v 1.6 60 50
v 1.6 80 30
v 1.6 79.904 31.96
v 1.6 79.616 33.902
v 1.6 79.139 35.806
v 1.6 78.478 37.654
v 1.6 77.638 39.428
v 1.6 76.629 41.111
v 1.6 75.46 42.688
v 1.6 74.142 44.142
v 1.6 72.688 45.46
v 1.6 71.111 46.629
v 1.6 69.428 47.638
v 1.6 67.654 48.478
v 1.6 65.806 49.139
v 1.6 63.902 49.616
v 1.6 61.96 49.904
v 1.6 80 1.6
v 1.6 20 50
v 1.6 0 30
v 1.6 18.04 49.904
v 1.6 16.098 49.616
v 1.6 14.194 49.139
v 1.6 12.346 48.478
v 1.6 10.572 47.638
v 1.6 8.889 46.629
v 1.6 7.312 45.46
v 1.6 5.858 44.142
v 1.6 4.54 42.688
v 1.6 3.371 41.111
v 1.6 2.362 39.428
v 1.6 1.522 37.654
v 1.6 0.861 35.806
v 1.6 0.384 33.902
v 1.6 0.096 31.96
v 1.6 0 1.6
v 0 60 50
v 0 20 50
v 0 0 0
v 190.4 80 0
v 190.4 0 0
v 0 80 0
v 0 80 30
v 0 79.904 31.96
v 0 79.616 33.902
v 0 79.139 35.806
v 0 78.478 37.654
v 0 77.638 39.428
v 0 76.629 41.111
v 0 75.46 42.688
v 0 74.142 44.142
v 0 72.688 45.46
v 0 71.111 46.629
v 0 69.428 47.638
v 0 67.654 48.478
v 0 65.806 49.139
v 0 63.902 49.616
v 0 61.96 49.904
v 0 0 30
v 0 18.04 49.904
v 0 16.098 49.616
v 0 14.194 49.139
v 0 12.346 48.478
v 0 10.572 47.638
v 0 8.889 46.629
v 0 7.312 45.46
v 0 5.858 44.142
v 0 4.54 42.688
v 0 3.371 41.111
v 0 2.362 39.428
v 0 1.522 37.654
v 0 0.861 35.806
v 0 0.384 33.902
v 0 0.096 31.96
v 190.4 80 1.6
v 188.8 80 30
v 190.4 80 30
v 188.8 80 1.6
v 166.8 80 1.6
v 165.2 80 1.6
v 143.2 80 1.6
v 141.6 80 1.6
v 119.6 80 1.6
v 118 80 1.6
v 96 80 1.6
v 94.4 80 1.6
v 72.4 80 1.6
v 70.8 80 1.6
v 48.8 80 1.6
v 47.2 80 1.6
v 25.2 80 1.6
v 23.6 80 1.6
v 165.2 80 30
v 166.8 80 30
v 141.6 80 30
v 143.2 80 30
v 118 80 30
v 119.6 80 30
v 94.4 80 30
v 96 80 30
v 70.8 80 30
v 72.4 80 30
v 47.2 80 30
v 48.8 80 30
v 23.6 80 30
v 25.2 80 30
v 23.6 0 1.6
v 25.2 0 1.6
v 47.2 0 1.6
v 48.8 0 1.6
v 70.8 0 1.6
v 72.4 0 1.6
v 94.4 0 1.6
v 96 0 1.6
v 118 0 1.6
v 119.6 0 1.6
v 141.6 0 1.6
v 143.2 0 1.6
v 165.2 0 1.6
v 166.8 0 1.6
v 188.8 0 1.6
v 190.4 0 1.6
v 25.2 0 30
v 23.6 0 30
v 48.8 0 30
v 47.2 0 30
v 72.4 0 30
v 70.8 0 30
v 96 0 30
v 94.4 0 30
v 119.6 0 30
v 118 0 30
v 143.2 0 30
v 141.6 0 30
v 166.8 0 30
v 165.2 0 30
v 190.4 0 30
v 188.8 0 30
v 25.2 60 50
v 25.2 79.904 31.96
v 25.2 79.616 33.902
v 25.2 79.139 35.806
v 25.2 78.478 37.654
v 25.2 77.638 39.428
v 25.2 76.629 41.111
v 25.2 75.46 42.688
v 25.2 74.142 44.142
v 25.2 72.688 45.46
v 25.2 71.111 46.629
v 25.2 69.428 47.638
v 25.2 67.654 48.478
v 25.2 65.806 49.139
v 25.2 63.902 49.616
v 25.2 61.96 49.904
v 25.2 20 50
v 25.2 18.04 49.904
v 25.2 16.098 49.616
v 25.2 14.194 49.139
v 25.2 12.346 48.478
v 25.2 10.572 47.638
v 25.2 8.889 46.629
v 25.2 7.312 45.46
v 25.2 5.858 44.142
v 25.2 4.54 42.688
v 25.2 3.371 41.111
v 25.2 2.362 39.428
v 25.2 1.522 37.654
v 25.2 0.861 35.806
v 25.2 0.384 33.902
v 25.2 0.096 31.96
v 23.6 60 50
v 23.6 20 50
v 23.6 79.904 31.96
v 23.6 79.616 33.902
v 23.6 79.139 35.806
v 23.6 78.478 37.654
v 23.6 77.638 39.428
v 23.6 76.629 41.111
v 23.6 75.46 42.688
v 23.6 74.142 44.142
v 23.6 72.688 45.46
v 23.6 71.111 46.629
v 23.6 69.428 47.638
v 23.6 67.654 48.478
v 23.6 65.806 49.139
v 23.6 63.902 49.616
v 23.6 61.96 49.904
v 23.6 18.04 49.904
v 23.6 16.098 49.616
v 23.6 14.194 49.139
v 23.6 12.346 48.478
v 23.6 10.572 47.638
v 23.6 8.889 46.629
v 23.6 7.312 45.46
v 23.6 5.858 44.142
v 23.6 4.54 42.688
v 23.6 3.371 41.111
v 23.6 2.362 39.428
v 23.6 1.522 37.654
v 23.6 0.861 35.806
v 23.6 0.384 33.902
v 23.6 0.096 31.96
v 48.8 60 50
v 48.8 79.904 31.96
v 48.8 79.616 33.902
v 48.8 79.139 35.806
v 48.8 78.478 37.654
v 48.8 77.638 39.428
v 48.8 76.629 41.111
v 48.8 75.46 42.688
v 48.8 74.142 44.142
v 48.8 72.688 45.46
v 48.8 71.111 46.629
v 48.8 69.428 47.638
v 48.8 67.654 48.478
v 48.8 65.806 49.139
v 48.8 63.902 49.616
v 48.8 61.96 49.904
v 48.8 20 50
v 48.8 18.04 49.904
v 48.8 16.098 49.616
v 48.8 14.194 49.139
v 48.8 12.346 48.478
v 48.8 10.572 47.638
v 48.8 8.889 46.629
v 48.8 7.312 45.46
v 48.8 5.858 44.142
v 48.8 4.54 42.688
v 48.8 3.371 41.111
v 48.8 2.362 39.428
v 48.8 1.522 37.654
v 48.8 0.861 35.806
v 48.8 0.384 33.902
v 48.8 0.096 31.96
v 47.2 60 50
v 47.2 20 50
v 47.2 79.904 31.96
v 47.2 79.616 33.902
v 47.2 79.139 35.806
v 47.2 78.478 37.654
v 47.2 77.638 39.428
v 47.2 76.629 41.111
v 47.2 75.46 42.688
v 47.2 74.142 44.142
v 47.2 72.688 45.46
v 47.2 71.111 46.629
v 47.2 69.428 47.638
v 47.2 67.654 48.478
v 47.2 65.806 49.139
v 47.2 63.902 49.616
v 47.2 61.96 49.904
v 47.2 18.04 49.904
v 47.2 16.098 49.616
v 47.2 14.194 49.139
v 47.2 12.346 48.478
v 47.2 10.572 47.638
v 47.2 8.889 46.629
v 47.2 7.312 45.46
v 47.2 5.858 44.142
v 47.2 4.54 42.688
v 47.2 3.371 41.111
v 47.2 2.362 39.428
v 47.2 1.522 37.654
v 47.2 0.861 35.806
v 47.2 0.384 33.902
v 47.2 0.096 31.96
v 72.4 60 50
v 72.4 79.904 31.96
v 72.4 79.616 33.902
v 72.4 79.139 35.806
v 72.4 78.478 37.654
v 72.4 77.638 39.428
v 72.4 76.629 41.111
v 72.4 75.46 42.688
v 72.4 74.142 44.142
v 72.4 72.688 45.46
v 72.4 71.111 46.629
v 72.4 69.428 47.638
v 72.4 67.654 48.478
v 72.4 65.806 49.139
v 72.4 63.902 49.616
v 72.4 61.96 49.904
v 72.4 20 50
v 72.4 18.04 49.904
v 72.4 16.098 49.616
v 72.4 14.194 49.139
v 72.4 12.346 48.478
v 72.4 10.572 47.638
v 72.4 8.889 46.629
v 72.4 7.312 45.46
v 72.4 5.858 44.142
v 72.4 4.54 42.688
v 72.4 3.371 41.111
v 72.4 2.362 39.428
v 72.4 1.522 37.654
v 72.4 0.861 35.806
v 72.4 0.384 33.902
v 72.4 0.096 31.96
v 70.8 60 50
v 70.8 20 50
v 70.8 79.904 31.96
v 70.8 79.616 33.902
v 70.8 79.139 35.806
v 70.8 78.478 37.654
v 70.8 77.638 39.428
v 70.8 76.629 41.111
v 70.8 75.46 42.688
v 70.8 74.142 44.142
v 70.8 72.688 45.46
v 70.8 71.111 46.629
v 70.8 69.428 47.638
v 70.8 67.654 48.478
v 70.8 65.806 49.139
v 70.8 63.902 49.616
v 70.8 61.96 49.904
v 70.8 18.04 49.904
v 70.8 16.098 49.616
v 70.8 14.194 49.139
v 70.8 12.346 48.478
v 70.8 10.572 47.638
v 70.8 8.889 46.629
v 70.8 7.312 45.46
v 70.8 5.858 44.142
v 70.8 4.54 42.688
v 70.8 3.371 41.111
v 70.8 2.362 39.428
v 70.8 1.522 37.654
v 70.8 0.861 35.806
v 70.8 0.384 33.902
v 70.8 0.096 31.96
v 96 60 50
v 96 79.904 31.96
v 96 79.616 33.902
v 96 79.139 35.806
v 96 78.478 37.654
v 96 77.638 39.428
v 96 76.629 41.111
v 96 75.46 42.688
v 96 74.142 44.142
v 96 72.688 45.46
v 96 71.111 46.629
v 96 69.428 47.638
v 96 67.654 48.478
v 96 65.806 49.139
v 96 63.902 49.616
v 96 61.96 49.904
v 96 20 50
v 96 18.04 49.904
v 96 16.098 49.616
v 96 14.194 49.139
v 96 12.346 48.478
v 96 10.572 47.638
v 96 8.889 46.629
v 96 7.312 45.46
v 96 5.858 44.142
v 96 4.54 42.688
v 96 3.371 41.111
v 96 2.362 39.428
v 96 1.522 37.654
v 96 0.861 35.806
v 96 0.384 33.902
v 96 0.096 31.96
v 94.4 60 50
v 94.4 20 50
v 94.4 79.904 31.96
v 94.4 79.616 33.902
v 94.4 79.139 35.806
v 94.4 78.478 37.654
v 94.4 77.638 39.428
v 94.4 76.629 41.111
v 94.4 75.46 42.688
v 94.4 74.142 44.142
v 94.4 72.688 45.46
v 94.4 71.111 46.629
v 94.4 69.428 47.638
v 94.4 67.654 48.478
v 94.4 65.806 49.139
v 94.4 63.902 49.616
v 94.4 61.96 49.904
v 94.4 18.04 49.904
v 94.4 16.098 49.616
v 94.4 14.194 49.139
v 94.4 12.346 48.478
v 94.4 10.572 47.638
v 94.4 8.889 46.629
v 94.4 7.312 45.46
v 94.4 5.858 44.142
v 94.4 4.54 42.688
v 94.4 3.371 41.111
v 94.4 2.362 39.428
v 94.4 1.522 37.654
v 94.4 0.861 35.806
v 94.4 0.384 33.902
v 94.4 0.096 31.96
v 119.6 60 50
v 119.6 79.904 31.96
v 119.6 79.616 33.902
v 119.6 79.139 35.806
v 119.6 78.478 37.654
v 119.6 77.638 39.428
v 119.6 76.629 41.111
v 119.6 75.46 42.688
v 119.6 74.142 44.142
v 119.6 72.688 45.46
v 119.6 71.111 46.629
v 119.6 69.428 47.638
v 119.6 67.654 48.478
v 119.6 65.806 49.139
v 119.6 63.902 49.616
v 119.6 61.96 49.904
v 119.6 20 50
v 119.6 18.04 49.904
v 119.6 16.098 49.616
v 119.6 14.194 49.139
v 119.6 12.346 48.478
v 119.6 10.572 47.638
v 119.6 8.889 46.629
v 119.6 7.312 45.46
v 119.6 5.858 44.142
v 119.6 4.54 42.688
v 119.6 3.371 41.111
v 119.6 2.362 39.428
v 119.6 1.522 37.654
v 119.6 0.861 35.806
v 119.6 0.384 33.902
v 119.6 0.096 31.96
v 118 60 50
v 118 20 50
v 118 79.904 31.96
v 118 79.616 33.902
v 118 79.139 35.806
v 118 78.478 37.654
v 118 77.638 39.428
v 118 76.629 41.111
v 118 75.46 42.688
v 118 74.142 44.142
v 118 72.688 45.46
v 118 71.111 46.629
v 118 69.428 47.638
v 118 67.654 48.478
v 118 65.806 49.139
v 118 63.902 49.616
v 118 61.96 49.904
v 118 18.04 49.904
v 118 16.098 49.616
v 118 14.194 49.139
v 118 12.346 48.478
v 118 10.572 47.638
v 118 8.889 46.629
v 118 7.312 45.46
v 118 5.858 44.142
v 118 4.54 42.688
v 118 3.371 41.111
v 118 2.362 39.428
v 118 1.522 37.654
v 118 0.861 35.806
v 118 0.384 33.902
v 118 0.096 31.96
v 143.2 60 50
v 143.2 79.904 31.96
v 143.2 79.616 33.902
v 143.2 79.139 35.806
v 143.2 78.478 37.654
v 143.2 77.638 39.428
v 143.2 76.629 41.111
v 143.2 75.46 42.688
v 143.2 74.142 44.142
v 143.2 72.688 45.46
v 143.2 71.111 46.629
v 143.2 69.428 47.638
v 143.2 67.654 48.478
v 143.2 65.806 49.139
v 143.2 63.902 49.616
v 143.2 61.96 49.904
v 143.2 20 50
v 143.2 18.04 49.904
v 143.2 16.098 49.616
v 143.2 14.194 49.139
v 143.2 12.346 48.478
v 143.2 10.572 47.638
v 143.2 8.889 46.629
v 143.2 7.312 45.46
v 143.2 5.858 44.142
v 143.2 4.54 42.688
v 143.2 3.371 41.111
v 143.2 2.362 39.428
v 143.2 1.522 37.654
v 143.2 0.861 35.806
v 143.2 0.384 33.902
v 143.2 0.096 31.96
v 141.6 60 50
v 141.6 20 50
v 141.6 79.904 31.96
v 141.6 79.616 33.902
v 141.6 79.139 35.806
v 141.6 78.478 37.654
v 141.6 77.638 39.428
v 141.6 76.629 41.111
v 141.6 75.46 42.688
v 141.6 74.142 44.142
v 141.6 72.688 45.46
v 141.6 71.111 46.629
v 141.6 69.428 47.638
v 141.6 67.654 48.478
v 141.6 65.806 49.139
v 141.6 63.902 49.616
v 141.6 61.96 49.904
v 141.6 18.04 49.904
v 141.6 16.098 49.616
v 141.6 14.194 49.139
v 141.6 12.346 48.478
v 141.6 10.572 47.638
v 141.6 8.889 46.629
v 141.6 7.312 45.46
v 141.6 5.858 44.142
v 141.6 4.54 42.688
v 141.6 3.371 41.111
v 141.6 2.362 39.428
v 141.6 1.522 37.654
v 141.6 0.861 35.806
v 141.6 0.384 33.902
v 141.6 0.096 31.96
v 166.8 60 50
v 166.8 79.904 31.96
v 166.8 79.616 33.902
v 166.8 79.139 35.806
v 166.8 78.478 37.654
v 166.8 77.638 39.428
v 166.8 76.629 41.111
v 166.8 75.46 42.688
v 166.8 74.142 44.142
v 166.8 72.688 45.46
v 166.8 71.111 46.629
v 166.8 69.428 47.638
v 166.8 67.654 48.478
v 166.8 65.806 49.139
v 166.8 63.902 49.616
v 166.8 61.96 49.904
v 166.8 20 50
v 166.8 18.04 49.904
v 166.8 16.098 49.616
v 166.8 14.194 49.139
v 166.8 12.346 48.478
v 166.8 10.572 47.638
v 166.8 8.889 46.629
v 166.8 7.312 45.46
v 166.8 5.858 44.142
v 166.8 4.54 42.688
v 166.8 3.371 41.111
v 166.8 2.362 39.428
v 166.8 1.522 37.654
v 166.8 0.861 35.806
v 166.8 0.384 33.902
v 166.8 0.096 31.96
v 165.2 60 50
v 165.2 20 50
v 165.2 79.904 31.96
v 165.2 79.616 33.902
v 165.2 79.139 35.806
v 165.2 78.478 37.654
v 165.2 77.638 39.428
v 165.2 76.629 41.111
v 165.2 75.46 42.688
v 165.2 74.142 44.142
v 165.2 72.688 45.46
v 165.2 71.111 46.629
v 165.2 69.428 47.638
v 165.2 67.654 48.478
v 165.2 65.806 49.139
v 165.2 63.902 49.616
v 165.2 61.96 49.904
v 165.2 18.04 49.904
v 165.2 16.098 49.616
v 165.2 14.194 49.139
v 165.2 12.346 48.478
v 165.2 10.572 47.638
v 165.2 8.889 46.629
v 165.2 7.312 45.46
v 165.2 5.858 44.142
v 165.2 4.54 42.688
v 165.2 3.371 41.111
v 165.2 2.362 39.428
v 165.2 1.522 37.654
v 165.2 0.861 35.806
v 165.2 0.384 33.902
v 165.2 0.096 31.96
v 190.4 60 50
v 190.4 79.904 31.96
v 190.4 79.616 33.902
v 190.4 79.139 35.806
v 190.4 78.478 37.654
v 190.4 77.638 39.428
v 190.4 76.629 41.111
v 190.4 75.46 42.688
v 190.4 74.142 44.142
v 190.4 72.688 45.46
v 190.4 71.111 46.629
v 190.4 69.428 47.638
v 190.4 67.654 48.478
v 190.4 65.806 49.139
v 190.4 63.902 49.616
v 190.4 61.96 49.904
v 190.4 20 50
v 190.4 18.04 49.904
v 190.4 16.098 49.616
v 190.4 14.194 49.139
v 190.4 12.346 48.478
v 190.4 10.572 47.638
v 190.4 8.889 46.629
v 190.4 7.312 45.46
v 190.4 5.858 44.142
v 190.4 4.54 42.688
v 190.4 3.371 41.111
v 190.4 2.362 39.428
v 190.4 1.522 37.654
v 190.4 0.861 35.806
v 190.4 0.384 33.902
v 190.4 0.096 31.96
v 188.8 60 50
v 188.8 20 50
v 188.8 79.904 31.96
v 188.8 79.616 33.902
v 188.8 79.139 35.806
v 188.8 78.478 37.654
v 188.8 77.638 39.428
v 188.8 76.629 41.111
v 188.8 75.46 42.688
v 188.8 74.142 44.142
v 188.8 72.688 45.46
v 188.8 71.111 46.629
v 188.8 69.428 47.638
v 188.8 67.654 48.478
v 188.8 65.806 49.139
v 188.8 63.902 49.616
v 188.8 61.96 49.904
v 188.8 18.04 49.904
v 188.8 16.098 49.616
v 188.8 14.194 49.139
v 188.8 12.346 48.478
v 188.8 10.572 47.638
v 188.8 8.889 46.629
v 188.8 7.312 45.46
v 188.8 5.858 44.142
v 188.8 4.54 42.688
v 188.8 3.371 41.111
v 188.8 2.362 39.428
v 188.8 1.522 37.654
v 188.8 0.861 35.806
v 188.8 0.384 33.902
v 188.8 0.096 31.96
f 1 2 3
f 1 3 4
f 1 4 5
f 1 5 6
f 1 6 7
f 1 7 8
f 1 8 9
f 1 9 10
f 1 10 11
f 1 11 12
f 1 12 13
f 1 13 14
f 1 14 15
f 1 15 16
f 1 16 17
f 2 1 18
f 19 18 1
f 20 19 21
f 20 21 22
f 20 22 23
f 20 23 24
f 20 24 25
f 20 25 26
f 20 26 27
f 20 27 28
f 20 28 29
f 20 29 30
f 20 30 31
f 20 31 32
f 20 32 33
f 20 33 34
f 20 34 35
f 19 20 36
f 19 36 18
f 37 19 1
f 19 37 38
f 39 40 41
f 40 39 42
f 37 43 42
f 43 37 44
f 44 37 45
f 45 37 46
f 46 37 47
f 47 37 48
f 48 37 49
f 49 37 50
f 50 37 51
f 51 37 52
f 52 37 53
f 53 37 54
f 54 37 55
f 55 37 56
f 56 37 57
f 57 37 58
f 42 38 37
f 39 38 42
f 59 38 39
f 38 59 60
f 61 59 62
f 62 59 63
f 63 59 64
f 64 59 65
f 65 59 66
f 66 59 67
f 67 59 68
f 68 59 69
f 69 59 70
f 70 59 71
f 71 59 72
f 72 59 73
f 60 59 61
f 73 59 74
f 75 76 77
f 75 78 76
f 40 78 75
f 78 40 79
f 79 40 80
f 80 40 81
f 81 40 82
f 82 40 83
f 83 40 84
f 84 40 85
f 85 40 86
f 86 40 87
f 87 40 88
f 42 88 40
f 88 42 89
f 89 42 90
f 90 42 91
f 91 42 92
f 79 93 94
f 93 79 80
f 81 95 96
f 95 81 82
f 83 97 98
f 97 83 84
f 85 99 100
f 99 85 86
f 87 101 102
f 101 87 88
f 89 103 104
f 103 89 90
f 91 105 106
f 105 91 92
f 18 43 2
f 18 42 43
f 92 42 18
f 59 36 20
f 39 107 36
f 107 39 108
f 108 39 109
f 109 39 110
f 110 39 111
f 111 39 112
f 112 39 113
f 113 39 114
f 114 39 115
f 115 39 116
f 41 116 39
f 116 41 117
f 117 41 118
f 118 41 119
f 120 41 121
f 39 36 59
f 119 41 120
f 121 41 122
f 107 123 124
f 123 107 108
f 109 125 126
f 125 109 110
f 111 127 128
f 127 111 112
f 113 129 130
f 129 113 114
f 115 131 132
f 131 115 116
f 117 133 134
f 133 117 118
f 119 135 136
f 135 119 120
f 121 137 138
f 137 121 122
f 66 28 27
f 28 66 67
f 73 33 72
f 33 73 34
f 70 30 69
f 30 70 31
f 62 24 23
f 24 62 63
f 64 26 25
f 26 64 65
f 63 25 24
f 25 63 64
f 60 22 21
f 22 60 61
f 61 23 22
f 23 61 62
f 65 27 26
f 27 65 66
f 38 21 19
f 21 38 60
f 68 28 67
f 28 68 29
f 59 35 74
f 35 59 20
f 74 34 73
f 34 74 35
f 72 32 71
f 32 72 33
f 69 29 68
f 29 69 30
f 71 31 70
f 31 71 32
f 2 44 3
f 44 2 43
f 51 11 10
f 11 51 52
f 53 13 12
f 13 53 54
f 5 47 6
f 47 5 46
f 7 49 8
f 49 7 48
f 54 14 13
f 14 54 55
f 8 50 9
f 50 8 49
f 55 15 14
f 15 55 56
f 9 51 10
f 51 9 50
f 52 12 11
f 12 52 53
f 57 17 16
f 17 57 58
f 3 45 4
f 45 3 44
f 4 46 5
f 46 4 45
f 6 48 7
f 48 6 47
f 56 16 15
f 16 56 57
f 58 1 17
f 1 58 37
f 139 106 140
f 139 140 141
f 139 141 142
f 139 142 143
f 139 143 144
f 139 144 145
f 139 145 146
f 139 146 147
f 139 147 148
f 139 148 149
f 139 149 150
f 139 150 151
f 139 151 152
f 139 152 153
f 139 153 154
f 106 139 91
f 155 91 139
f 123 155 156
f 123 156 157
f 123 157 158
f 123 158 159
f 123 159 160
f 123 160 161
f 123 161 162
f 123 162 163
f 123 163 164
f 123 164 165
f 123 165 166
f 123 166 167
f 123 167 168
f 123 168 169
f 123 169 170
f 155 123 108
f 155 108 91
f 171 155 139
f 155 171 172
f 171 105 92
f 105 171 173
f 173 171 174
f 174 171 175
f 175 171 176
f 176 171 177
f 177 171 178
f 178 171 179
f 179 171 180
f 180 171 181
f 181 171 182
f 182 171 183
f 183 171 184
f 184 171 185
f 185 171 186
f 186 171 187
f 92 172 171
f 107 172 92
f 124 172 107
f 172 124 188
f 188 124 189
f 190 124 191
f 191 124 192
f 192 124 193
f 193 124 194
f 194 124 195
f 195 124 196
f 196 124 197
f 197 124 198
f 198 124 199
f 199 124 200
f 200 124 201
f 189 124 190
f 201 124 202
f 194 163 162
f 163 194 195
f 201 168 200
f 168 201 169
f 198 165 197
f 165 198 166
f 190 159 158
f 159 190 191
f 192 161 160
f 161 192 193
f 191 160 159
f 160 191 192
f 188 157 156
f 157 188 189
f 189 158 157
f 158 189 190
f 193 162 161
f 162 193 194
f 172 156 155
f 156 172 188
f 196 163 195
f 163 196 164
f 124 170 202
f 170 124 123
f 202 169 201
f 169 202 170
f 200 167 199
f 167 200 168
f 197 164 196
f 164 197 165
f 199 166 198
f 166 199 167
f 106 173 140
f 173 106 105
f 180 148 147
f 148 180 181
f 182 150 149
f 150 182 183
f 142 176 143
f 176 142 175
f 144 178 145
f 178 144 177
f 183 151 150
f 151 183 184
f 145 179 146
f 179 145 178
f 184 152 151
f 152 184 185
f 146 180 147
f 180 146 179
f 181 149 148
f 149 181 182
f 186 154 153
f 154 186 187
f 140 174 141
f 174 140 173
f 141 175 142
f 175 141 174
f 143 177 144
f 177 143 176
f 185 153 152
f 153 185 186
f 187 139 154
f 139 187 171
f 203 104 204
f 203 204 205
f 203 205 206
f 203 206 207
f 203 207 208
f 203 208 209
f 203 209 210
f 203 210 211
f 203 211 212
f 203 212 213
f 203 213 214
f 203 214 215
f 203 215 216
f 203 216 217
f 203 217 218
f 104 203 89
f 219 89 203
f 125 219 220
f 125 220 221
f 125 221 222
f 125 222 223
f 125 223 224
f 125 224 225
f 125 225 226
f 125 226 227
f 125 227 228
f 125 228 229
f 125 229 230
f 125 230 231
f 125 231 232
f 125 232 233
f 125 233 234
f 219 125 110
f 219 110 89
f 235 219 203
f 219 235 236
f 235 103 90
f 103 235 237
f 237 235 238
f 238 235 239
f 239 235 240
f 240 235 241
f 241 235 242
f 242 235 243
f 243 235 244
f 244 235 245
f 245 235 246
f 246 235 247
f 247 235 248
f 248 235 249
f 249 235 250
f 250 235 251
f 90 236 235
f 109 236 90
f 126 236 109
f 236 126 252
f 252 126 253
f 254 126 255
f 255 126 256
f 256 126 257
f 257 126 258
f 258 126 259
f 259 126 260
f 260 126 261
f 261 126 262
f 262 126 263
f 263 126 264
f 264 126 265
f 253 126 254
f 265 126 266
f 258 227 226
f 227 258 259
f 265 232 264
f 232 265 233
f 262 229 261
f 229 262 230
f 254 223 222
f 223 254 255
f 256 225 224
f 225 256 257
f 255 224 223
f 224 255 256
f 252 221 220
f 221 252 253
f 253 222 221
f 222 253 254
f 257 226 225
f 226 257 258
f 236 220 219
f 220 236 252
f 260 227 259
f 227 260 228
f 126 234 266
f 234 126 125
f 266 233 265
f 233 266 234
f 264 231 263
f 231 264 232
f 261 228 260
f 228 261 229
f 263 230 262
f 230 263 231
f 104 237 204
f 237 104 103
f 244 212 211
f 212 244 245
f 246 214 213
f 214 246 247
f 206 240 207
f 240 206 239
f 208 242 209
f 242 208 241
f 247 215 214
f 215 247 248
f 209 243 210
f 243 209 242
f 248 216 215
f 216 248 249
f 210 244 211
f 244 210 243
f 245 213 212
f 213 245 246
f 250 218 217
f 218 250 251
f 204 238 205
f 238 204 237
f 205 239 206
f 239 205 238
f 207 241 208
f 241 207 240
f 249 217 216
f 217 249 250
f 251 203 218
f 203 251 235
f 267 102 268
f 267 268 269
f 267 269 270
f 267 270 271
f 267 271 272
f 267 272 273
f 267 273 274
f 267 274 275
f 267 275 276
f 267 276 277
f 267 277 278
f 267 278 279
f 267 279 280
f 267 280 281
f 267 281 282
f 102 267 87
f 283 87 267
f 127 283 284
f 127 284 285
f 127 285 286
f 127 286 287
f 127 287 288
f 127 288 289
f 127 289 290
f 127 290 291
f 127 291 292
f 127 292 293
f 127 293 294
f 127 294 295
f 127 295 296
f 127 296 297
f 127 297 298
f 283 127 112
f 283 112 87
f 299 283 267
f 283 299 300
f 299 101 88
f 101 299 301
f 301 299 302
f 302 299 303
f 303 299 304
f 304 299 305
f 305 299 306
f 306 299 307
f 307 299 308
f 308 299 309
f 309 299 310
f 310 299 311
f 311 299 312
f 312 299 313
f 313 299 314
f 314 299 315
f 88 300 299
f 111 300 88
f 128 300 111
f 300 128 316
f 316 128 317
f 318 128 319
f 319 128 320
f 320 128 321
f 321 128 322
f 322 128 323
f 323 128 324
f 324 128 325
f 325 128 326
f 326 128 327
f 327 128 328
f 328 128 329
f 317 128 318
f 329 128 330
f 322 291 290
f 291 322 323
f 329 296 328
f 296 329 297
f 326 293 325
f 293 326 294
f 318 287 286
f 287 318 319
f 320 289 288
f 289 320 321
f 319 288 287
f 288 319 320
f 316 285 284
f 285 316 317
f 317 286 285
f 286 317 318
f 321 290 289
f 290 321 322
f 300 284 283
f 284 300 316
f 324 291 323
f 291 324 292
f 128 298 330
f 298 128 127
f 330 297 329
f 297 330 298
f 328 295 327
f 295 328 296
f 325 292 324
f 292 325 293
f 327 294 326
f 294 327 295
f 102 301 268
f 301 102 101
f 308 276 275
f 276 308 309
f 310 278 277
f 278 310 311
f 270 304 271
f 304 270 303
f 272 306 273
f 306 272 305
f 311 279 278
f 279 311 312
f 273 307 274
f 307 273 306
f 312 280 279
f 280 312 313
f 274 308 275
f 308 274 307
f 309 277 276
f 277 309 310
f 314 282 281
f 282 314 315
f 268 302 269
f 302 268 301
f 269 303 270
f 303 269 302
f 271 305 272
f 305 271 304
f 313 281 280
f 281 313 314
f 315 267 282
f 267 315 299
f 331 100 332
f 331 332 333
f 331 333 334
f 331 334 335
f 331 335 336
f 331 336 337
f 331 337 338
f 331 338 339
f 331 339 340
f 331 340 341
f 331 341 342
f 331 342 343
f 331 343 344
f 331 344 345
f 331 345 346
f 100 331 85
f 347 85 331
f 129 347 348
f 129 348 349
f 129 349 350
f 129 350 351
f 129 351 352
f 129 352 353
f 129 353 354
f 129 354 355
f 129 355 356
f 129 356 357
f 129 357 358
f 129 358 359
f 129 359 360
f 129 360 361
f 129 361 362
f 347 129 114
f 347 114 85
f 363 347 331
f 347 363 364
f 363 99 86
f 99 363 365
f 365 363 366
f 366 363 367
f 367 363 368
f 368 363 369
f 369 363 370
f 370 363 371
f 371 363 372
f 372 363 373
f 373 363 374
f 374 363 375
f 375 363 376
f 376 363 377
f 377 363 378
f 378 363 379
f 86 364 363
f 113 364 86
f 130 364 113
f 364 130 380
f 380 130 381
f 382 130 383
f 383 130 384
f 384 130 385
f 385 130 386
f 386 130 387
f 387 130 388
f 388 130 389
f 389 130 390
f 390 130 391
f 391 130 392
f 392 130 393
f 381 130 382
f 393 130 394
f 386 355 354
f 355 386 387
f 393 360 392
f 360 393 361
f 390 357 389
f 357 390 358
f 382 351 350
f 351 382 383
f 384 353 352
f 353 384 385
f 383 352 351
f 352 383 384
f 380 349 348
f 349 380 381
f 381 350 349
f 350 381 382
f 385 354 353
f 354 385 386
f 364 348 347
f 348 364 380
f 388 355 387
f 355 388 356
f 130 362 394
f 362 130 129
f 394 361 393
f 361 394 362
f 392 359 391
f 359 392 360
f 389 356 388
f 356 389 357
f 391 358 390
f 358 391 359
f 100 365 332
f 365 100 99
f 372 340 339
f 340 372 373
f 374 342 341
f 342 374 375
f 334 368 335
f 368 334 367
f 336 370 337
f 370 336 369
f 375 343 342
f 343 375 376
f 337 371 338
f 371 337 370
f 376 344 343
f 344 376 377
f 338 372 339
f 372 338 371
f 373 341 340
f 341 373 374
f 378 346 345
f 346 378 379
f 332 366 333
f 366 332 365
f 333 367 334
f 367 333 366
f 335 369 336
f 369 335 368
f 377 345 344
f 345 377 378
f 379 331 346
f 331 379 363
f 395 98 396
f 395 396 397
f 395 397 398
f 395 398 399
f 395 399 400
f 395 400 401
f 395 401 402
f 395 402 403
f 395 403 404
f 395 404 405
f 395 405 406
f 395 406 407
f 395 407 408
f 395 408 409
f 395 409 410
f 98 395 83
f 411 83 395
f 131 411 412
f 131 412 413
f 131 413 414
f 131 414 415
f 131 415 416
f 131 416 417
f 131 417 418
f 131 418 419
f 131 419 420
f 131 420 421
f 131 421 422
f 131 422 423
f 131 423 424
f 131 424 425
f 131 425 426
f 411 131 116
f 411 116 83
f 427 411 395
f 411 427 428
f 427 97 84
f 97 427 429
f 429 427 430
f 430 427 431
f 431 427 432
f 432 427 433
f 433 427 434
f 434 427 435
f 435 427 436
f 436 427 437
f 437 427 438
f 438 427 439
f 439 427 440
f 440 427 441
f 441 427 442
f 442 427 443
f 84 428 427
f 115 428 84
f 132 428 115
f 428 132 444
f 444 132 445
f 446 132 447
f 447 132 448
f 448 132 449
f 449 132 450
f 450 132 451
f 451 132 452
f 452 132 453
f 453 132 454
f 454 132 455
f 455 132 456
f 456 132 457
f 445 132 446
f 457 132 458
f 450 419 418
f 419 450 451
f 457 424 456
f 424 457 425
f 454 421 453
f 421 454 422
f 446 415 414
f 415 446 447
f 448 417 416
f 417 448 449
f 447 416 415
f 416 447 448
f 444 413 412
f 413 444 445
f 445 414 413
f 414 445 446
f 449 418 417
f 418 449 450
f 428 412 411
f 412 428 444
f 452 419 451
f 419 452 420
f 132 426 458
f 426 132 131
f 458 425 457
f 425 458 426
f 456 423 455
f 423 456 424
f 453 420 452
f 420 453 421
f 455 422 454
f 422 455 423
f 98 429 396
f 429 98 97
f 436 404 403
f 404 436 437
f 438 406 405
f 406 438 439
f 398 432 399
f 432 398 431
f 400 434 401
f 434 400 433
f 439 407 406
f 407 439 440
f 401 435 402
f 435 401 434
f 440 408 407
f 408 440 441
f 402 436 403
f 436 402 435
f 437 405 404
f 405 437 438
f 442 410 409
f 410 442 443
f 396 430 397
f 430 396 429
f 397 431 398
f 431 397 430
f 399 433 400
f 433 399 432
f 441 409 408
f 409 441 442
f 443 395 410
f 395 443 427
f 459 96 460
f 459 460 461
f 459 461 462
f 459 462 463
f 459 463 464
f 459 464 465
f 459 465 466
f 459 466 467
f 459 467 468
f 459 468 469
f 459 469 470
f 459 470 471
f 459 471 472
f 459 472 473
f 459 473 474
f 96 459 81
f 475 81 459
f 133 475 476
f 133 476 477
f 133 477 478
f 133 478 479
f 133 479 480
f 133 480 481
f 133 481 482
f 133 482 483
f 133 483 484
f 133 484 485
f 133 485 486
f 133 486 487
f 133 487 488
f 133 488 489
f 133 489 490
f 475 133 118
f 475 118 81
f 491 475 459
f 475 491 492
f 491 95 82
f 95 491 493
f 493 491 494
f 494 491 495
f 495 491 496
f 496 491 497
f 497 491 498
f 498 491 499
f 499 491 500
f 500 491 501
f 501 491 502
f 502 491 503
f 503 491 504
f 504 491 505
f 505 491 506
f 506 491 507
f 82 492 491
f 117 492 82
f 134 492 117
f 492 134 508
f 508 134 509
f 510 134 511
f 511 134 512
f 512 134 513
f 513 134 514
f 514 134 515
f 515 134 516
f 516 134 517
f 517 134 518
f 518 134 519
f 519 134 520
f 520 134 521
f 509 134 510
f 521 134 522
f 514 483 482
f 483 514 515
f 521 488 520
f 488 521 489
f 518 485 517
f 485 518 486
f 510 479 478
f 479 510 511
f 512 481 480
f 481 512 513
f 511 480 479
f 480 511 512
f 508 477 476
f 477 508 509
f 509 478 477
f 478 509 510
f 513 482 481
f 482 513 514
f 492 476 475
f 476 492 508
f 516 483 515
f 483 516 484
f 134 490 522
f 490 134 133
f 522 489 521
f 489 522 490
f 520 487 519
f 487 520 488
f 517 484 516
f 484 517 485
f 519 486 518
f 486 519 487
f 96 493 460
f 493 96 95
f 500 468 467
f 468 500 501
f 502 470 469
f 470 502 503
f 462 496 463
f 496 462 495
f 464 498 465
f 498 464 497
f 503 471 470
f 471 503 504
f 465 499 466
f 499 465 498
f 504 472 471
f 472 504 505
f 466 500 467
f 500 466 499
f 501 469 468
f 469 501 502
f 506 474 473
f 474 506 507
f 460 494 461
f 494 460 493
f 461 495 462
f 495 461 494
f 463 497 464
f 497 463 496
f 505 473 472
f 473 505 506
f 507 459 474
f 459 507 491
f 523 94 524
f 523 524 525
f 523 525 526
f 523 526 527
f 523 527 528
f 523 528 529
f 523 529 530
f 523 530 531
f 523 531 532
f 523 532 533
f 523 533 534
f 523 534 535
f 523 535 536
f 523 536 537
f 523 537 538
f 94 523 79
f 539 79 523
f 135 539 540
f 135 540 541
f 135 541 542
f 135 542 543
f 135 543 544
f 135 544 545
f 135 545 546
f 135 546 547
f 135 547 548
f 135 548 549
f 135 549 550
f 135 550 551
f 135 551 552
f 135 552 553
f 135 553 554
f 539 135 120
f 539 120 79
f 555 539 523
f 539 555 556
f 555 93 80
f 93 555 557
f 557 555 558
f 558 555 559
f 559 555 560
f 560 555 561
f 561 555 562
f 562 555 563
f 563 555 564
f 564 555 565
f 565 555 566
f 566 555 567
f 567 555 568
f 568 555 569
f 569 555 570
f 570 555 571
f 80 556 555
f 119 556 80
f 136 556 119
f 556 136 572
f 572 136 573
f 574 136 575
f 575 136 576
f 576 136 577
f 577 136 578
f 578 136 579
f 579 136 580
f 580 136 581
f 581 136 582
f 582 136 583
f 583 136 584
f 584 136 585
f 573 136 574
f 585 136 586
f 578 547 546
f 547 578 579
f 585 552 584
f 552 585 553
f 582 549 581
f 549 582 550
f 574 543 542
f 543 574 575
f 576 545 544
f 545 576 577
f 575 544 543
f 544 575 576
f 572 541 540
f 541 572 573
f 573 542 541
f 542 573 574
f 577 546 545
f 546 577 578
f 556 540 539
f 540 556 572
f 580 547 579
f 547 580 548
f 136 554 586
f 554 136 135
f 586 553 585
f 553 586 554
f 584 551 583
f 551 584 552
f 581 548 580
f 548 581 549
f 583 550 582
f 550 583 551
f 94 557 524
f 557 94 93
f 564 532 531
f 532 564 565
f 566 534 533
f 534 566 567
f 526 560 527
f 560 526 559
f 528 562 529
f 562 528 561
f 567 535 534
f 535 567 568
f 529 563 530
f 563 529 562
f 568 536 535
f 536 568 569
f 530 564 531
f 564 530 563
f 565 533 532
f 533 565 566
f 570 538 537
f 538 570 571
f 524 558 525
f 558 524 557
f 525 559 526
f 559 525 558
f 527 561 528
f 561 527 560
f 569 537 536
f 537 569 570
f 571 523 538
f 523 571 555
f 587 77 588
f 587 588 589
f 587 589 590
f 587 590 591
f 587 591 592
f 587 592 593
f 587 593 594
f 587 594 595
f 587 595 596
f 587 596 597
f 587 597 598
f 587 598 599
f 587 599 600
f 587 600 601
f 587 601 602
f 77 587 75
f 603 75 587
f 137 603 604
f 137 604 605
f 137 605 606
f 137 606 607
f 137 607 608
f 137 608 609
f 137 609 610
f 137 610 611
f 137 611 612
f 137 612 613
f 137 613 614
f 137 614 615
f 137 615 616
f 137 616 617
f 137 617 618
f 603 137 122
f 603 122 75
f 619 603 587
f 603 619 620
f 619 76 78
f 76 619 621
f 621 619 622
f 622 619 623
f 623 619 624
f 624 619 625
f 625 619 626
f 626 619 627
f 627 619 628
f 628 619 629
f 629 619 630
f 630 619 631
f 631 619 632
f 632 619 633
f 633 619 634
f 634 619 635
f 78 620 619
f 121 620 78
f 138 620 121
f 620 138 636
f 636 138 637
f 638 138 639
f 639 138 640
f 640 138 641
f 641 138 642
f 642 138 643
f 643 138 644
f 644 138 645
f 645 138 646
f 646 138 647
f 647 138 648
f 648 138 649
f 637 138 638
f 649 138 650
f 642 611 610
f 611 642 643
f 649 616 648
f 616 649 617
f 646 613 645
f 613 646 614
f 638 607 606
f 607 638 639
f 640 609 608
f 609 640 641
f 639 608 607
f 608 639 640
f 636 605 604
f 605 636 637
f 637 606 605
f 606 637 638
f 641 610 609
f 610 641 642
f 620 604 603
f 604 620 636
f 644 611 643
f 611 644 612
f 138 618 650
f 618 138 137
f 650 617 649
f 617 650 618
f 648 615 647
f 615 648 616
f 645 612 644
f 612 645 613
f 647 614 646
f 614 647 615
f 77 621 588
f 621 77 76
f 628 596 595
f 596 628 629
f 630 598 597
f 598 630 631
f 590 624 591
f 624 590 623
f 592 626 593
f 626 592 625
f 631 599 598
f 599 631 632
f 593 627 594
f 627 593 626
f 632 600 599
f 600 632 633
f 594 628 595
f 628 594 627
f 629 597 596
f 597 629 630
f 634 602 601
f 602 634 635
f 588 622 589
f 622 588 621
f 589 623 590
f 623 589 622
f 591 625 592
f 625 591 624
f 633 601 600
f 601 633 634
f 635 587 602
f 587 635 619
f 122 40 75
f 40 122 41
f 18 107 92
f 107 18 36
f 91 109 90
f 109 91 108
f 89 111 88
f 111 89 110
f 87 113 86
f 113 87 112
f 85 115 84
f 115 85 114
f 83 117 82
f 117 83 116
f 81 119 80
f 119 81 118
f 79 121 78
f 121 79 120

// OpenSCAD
depth = 80;
inner_width = 22;
wall_width = 1.6;
height = 50;
amount = 8;
floor_thickness = 1.6;
rounding = 20;

/* [Hidden] */
$fn = 64;

width = wall_width + (inner_width + wall_width) * amount;

cube([width, depth, floor_thickness]);

for(i = [0:amount]) {
    x = i * (inner_width + wall_width);
    translate([x, 0, 0]) {
        wall();
    }
}

module wall() {
    // Center full-height wall piece.
    translate([0, rounding, 0]) {
        cube([wall_width, depth - rounding * 2, height]);
    }
    // Bottom full-depth wall piece.
    cube([wall_width, depth, height - rounding]);
    // Front rounding.
    translate([0, rounding, height - rounding]) {
        rotate([0, 90, 0]) {
            cylinder(h = wall_width, r = rounding);
        }
    }
    // Rear rounding.
    translate([0, depth - rounding, height - rounding]) {
        rotate([0, 90, 0]) {
            cylinder(h = wall_width, r = rounding);
        }
    }
}
